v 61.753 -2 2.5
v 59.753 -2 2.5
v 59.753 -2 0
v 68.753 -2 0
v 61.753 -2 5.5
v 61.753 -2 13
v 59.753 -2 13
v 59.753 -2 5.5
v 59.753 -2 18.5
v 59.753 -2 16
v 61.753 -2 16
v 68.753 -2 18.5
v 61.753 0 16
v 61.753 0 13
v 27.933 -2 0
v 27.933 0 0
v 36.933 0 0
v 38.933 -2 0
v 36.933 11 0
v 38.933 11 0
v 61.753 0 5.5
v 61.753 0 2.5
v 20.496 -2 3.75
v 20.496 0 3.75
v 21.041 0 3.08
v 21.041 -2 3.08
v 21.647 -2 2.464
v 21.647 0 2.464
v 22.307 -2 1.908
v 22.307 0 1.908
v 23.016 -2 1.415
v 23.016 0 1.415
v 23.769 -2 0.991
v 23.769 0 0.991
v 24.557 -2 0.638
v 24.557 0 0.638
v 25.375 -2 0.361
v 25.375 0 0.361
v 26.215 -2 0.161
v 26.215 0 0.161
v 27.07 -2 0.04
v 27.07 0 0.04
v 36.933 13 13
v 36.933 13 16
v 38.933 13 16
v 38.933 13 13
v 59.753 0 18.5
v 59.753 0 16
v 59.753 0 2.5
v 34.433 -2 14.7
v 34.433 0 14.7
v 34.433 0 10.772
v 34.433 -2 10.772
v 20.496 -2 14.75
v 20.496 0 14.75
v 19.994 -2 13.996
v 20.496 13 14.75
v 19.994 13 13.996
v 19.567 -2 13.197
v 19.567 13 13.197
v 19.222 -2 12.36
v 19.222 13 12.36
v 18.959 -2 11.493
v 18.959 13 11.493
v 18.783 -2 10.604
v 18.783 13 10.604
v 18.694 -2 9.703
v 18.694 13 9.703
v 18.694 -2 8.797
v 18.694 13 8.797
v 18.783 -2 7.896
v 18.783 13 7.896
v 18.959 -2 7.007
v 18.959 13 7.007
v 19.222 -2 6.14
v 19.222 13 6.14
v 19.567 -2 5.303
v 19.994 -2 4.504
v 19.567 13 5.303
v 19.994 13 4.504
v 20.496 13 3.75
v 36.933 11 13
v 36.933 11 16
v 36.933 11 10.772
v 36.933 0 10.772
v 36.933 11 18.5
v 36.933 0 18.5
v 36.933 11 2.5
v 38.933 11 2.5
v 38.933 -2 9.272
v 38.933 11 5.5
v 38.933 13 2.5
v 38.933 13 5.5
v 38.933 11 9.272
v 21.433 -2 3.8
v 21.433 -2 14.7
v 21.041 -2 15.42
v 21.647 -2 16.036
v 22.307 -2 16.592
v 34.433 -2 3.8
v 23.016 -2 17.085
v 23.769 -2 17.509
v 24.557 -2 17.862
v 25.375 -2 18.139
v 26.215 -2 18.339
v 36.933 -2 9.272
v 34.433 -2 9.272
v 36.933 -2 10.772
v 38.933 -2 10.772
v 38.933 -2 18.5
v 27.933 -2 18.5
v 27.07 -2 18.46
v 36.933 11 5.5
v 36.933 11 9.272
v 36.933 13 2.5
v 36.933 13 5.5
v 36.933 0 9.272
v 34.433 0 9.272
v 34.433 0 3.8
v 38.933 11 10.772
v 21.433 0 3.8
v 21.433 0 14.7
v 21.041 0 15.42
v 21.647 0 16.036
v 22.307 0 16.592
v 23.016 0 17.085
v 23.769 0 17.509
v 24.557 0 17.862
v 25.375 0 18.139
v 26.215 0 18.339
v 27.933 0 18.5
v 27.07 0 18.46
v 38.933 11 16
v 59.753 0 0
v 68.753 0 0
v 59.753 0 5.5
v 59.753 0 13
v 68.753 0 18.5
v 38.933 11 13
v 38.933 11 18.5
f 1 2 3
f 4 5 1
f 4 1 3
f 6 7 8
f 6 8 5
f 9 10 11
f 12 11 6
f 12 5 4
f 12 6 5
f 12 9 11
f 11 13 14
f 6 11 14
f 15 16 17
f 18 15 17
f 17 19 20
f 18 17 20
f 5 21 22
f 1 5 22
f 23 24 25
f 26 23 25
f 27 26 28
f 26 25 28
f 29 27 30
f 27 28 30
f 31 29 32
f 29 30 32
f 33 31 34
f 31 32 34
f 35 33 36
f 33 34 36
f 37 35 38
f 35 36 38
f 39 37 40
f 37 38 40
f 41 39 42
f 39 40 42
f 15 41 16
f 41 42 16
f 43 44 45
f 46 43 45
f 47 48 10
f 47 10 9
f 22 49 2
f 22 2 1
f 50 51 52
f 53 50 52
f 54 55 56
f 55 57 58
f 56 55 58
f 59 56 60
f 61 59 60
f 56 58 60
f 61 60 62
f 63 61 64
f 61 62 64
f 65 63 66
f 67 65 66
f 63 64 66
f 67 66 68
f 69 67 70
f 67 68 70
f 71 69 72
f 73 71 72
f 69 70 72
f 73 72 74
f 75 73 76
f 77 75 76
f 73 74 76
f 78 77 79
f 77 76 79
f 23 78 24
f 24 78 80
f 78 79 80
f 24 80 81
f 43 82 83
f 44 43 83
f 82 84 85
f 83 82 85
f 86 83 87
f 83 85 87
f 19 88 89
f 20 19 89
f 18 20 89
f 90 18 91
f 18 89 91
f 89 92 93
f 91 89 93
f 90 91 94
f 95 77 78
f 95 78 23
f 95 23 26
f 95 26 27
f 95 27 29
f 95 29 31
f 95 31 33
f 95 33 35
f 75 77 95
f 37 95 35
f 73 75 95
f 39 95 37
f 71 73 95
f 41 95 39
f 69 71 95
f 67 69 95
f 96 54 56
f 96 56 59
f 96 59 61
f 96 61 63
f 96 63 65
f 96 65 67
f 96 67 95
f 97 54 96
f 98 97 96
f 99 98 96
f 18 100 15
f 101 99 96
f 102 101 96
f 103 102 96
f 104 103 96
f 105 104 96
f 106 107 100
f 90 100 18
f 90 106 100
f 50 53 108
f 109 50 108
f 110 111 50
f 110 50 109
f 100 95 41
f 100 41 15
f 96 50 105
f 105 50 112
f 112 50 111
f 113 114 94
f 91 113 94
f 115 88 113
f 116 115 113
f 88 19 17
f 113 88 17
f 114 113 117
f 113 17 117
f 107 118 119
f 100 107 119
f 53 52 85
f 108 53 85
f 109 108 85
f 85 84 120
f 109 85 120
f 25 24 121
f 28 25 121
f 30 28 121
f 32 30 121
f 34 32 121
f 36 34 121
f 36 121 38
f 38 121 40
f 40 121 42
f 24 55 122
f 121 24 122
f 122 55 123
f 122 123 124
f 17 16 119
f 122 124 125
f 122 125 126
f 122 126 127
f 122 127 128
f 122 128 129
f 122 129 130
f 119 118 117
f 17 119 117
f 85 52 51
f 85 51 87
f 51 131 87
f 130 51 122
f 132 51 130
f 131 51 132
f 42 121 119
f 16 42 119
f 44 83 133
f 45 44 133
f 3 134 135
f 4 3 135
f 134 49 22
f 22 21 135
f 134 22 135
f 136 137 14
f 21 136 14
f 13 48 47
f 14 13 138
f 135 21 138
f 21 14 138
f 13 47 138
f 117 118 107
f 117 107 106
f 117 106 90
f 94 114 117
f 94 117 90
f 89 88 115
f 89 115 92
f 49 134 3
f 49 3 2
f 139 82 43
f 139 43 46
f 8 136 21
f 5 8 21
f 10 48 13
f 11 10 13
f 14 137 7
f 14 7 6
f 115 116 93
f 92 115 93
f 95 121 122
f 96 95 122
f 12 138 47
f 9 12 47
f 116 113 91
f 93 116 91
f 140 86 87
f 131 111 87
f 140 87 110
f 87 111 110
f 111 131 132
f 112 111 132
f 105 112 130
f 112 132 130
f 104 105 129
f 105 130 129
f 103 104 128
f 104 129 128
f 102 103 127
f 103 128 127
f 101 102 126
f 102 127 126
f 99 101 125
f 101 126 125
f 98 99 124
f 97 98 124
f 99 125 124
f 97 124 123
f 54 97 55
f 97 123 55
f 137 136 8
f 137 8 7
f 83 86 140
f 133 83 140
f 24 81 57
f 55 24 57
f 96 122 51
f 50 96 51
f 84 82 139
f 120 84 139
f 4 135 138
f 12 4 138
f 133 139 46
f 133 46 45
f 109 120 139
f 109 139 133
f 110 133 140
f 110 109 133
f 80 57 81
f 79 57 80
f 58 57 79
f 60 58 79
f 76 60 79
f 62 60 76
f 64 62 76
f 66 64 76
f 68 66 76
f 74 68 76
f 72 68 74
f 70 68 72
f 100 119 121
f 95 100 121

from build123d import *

# Parameters (mm, degrees)
F0_W     = 2
F0_H     = 2.5
F0_H_2   = 3
F0_H_3   = 2.2283997163
F0_H_4   = 3.7716002837
F1_DEPTH = 2
F0_H_5   = 7.5
F2_DEPTH = 13
F3_DEPTH = 11


# Not quite as in the source:
# - a feature names something its author has since deleted; it is built from what else it names


with BuildPart() as f1:
    # F0 (on Front) → F1 (new body)
    with BuildSketch(Plane.XZ):
        Polygon((27.9331561178, 18.5), (27.9331561178, 14.7), (34.4331561178, 14.7), (34.4331561178, 10.7716002837), (36.9331561178, 10.7716002837), (36.9331561178, 13), (36.9331561178, 16), (36.9331561178, 18.5), align=None)
        with BuildLine():
            ThreePointArc((20.4959187275, 3.75), (23.7685733056, 0.9905357317), (27.9331561178, 0))
            Line((27.9331561178, 0), (27.9331561178, 3.8))
            Line((27.9331561178, 3.8), (21.4331561178, 3.8))
            Line((21.4331561178, 3.8), (21.4331561178, 14.7))
            Line((21.4331561178, 14.7), (27.9331561178, 14.7))
            Line((27.9331561178, 14.7), (27.9331561178, 18.5))
            ThreePointArc((27.9331561178, 18.5), (23.7685733056, 17.5094642683), (20.4959187275, 14.75))
            Line((20.4959187275, 14.75), (20.4959187275, 3.75))
        make_face()
        Polygon((27.9331561178, 3.8), (27.9331561178, 0), (36.9331561178, 0), (36.9331561178, 2.5), (36.9331561178, 5.5), (36.9331561178, 9.2716002837), (34.4331561178, 9.2716002837), (34.4331561178, 3.8), align=None)
        with Locations((37.9331561178, 17.25)):
            Rectangle(F0_W, F0_H)
        with Locations((37.9331561178, 14.5)):
            Rectangle(F0_W, F0_H_2)
        with Locations((37.9331561178, 11.8858001418)):
            Rectangle(F0_W, F0_H_3)
        with Locations((37.9331561178, 7.3858001418)):
            Rectangle(F0_W, F0_H_4)
        with Locations((37.9331561178, 4)):
            Rectangle(F0_W, F0_H_2)
        with Locations((37.9331561178, 1.25)):
            Rectangle(F0_W, F0_H)
        with BuildLine():
            ThreePointArc((20.4959187275, 14.75), (18.6831561178, 9.25), (20.4959187275, 3.75))
            Line((20.4959187275, 3.75), (20.4959187275, 14.75))
        make_face()
    extrude(amount=F1_DEPTH)

    # F0 (on Front) → F2 (join)
    with BuildSketch(Plane.XZ):
        with Locations((37.9331561178, 14.5)):
            Rectangle(F0_W, F0_H_2)
        with Locations((37.9331561178, 4)):
            Rectangle(F0_W, F0_H_2)
        with BuildLine():
            ThreePointArc((20.4959187275, 14.75), (18.6831561178, 9.25), (20.4959187275, 3.75))
            Line((20.4959187275, 3.75), (20.4959187275, 14.75))
        make_face()
    extrude(amount=-F2_DEPTH)

    # F0 (on Front) → F3 (join)
    with BuildSketch(Plane.XZ):
        with Locations((37.9331561178, 17.25)):
            Rectangle(F0_W, F0_H)
        with Locations((37.9331561178, 11.8858001418)):
            Rectangle(F0_W, F0_H_3)
        with Locations((37.9331561178, 7.3858001418)):
            Rectangle(F0_W, F0_H_4)
        with Locations((37.9331561178, 1.25)):
            Rectangle(F0_W, F0_H)
    extrude(amount=-F3_DEPTH)


with BuildPart() as f1b:
    # F0 (on Front) → F1, piece 2 (new body)
    with BuildSketch(Plane.XZ):
        Polygon((68.7529053539, 18.5), (61.7529053539, 18.5), (61.7529053539, 16), (61.7529053539, 13), (61.7529053539, 5.5), (61.7529053539, 2.5), (61.7529053539, 0), (68.7529053539, 0), align=None)
        with Locations((60.7529053539, 17.25)):
            Rectangle(F0_W, F0_H)
        with Locations((60.7529053539, 9.25)):
            Rectangle(F0_W, F0_H_5)
        with Locations((60.7529053539, 1.25)):
            Rectangle(F0_W, F0_H)
    extrude(amount=F1_DEPTH)


solid = Compound([f1.part, f1b.part])
